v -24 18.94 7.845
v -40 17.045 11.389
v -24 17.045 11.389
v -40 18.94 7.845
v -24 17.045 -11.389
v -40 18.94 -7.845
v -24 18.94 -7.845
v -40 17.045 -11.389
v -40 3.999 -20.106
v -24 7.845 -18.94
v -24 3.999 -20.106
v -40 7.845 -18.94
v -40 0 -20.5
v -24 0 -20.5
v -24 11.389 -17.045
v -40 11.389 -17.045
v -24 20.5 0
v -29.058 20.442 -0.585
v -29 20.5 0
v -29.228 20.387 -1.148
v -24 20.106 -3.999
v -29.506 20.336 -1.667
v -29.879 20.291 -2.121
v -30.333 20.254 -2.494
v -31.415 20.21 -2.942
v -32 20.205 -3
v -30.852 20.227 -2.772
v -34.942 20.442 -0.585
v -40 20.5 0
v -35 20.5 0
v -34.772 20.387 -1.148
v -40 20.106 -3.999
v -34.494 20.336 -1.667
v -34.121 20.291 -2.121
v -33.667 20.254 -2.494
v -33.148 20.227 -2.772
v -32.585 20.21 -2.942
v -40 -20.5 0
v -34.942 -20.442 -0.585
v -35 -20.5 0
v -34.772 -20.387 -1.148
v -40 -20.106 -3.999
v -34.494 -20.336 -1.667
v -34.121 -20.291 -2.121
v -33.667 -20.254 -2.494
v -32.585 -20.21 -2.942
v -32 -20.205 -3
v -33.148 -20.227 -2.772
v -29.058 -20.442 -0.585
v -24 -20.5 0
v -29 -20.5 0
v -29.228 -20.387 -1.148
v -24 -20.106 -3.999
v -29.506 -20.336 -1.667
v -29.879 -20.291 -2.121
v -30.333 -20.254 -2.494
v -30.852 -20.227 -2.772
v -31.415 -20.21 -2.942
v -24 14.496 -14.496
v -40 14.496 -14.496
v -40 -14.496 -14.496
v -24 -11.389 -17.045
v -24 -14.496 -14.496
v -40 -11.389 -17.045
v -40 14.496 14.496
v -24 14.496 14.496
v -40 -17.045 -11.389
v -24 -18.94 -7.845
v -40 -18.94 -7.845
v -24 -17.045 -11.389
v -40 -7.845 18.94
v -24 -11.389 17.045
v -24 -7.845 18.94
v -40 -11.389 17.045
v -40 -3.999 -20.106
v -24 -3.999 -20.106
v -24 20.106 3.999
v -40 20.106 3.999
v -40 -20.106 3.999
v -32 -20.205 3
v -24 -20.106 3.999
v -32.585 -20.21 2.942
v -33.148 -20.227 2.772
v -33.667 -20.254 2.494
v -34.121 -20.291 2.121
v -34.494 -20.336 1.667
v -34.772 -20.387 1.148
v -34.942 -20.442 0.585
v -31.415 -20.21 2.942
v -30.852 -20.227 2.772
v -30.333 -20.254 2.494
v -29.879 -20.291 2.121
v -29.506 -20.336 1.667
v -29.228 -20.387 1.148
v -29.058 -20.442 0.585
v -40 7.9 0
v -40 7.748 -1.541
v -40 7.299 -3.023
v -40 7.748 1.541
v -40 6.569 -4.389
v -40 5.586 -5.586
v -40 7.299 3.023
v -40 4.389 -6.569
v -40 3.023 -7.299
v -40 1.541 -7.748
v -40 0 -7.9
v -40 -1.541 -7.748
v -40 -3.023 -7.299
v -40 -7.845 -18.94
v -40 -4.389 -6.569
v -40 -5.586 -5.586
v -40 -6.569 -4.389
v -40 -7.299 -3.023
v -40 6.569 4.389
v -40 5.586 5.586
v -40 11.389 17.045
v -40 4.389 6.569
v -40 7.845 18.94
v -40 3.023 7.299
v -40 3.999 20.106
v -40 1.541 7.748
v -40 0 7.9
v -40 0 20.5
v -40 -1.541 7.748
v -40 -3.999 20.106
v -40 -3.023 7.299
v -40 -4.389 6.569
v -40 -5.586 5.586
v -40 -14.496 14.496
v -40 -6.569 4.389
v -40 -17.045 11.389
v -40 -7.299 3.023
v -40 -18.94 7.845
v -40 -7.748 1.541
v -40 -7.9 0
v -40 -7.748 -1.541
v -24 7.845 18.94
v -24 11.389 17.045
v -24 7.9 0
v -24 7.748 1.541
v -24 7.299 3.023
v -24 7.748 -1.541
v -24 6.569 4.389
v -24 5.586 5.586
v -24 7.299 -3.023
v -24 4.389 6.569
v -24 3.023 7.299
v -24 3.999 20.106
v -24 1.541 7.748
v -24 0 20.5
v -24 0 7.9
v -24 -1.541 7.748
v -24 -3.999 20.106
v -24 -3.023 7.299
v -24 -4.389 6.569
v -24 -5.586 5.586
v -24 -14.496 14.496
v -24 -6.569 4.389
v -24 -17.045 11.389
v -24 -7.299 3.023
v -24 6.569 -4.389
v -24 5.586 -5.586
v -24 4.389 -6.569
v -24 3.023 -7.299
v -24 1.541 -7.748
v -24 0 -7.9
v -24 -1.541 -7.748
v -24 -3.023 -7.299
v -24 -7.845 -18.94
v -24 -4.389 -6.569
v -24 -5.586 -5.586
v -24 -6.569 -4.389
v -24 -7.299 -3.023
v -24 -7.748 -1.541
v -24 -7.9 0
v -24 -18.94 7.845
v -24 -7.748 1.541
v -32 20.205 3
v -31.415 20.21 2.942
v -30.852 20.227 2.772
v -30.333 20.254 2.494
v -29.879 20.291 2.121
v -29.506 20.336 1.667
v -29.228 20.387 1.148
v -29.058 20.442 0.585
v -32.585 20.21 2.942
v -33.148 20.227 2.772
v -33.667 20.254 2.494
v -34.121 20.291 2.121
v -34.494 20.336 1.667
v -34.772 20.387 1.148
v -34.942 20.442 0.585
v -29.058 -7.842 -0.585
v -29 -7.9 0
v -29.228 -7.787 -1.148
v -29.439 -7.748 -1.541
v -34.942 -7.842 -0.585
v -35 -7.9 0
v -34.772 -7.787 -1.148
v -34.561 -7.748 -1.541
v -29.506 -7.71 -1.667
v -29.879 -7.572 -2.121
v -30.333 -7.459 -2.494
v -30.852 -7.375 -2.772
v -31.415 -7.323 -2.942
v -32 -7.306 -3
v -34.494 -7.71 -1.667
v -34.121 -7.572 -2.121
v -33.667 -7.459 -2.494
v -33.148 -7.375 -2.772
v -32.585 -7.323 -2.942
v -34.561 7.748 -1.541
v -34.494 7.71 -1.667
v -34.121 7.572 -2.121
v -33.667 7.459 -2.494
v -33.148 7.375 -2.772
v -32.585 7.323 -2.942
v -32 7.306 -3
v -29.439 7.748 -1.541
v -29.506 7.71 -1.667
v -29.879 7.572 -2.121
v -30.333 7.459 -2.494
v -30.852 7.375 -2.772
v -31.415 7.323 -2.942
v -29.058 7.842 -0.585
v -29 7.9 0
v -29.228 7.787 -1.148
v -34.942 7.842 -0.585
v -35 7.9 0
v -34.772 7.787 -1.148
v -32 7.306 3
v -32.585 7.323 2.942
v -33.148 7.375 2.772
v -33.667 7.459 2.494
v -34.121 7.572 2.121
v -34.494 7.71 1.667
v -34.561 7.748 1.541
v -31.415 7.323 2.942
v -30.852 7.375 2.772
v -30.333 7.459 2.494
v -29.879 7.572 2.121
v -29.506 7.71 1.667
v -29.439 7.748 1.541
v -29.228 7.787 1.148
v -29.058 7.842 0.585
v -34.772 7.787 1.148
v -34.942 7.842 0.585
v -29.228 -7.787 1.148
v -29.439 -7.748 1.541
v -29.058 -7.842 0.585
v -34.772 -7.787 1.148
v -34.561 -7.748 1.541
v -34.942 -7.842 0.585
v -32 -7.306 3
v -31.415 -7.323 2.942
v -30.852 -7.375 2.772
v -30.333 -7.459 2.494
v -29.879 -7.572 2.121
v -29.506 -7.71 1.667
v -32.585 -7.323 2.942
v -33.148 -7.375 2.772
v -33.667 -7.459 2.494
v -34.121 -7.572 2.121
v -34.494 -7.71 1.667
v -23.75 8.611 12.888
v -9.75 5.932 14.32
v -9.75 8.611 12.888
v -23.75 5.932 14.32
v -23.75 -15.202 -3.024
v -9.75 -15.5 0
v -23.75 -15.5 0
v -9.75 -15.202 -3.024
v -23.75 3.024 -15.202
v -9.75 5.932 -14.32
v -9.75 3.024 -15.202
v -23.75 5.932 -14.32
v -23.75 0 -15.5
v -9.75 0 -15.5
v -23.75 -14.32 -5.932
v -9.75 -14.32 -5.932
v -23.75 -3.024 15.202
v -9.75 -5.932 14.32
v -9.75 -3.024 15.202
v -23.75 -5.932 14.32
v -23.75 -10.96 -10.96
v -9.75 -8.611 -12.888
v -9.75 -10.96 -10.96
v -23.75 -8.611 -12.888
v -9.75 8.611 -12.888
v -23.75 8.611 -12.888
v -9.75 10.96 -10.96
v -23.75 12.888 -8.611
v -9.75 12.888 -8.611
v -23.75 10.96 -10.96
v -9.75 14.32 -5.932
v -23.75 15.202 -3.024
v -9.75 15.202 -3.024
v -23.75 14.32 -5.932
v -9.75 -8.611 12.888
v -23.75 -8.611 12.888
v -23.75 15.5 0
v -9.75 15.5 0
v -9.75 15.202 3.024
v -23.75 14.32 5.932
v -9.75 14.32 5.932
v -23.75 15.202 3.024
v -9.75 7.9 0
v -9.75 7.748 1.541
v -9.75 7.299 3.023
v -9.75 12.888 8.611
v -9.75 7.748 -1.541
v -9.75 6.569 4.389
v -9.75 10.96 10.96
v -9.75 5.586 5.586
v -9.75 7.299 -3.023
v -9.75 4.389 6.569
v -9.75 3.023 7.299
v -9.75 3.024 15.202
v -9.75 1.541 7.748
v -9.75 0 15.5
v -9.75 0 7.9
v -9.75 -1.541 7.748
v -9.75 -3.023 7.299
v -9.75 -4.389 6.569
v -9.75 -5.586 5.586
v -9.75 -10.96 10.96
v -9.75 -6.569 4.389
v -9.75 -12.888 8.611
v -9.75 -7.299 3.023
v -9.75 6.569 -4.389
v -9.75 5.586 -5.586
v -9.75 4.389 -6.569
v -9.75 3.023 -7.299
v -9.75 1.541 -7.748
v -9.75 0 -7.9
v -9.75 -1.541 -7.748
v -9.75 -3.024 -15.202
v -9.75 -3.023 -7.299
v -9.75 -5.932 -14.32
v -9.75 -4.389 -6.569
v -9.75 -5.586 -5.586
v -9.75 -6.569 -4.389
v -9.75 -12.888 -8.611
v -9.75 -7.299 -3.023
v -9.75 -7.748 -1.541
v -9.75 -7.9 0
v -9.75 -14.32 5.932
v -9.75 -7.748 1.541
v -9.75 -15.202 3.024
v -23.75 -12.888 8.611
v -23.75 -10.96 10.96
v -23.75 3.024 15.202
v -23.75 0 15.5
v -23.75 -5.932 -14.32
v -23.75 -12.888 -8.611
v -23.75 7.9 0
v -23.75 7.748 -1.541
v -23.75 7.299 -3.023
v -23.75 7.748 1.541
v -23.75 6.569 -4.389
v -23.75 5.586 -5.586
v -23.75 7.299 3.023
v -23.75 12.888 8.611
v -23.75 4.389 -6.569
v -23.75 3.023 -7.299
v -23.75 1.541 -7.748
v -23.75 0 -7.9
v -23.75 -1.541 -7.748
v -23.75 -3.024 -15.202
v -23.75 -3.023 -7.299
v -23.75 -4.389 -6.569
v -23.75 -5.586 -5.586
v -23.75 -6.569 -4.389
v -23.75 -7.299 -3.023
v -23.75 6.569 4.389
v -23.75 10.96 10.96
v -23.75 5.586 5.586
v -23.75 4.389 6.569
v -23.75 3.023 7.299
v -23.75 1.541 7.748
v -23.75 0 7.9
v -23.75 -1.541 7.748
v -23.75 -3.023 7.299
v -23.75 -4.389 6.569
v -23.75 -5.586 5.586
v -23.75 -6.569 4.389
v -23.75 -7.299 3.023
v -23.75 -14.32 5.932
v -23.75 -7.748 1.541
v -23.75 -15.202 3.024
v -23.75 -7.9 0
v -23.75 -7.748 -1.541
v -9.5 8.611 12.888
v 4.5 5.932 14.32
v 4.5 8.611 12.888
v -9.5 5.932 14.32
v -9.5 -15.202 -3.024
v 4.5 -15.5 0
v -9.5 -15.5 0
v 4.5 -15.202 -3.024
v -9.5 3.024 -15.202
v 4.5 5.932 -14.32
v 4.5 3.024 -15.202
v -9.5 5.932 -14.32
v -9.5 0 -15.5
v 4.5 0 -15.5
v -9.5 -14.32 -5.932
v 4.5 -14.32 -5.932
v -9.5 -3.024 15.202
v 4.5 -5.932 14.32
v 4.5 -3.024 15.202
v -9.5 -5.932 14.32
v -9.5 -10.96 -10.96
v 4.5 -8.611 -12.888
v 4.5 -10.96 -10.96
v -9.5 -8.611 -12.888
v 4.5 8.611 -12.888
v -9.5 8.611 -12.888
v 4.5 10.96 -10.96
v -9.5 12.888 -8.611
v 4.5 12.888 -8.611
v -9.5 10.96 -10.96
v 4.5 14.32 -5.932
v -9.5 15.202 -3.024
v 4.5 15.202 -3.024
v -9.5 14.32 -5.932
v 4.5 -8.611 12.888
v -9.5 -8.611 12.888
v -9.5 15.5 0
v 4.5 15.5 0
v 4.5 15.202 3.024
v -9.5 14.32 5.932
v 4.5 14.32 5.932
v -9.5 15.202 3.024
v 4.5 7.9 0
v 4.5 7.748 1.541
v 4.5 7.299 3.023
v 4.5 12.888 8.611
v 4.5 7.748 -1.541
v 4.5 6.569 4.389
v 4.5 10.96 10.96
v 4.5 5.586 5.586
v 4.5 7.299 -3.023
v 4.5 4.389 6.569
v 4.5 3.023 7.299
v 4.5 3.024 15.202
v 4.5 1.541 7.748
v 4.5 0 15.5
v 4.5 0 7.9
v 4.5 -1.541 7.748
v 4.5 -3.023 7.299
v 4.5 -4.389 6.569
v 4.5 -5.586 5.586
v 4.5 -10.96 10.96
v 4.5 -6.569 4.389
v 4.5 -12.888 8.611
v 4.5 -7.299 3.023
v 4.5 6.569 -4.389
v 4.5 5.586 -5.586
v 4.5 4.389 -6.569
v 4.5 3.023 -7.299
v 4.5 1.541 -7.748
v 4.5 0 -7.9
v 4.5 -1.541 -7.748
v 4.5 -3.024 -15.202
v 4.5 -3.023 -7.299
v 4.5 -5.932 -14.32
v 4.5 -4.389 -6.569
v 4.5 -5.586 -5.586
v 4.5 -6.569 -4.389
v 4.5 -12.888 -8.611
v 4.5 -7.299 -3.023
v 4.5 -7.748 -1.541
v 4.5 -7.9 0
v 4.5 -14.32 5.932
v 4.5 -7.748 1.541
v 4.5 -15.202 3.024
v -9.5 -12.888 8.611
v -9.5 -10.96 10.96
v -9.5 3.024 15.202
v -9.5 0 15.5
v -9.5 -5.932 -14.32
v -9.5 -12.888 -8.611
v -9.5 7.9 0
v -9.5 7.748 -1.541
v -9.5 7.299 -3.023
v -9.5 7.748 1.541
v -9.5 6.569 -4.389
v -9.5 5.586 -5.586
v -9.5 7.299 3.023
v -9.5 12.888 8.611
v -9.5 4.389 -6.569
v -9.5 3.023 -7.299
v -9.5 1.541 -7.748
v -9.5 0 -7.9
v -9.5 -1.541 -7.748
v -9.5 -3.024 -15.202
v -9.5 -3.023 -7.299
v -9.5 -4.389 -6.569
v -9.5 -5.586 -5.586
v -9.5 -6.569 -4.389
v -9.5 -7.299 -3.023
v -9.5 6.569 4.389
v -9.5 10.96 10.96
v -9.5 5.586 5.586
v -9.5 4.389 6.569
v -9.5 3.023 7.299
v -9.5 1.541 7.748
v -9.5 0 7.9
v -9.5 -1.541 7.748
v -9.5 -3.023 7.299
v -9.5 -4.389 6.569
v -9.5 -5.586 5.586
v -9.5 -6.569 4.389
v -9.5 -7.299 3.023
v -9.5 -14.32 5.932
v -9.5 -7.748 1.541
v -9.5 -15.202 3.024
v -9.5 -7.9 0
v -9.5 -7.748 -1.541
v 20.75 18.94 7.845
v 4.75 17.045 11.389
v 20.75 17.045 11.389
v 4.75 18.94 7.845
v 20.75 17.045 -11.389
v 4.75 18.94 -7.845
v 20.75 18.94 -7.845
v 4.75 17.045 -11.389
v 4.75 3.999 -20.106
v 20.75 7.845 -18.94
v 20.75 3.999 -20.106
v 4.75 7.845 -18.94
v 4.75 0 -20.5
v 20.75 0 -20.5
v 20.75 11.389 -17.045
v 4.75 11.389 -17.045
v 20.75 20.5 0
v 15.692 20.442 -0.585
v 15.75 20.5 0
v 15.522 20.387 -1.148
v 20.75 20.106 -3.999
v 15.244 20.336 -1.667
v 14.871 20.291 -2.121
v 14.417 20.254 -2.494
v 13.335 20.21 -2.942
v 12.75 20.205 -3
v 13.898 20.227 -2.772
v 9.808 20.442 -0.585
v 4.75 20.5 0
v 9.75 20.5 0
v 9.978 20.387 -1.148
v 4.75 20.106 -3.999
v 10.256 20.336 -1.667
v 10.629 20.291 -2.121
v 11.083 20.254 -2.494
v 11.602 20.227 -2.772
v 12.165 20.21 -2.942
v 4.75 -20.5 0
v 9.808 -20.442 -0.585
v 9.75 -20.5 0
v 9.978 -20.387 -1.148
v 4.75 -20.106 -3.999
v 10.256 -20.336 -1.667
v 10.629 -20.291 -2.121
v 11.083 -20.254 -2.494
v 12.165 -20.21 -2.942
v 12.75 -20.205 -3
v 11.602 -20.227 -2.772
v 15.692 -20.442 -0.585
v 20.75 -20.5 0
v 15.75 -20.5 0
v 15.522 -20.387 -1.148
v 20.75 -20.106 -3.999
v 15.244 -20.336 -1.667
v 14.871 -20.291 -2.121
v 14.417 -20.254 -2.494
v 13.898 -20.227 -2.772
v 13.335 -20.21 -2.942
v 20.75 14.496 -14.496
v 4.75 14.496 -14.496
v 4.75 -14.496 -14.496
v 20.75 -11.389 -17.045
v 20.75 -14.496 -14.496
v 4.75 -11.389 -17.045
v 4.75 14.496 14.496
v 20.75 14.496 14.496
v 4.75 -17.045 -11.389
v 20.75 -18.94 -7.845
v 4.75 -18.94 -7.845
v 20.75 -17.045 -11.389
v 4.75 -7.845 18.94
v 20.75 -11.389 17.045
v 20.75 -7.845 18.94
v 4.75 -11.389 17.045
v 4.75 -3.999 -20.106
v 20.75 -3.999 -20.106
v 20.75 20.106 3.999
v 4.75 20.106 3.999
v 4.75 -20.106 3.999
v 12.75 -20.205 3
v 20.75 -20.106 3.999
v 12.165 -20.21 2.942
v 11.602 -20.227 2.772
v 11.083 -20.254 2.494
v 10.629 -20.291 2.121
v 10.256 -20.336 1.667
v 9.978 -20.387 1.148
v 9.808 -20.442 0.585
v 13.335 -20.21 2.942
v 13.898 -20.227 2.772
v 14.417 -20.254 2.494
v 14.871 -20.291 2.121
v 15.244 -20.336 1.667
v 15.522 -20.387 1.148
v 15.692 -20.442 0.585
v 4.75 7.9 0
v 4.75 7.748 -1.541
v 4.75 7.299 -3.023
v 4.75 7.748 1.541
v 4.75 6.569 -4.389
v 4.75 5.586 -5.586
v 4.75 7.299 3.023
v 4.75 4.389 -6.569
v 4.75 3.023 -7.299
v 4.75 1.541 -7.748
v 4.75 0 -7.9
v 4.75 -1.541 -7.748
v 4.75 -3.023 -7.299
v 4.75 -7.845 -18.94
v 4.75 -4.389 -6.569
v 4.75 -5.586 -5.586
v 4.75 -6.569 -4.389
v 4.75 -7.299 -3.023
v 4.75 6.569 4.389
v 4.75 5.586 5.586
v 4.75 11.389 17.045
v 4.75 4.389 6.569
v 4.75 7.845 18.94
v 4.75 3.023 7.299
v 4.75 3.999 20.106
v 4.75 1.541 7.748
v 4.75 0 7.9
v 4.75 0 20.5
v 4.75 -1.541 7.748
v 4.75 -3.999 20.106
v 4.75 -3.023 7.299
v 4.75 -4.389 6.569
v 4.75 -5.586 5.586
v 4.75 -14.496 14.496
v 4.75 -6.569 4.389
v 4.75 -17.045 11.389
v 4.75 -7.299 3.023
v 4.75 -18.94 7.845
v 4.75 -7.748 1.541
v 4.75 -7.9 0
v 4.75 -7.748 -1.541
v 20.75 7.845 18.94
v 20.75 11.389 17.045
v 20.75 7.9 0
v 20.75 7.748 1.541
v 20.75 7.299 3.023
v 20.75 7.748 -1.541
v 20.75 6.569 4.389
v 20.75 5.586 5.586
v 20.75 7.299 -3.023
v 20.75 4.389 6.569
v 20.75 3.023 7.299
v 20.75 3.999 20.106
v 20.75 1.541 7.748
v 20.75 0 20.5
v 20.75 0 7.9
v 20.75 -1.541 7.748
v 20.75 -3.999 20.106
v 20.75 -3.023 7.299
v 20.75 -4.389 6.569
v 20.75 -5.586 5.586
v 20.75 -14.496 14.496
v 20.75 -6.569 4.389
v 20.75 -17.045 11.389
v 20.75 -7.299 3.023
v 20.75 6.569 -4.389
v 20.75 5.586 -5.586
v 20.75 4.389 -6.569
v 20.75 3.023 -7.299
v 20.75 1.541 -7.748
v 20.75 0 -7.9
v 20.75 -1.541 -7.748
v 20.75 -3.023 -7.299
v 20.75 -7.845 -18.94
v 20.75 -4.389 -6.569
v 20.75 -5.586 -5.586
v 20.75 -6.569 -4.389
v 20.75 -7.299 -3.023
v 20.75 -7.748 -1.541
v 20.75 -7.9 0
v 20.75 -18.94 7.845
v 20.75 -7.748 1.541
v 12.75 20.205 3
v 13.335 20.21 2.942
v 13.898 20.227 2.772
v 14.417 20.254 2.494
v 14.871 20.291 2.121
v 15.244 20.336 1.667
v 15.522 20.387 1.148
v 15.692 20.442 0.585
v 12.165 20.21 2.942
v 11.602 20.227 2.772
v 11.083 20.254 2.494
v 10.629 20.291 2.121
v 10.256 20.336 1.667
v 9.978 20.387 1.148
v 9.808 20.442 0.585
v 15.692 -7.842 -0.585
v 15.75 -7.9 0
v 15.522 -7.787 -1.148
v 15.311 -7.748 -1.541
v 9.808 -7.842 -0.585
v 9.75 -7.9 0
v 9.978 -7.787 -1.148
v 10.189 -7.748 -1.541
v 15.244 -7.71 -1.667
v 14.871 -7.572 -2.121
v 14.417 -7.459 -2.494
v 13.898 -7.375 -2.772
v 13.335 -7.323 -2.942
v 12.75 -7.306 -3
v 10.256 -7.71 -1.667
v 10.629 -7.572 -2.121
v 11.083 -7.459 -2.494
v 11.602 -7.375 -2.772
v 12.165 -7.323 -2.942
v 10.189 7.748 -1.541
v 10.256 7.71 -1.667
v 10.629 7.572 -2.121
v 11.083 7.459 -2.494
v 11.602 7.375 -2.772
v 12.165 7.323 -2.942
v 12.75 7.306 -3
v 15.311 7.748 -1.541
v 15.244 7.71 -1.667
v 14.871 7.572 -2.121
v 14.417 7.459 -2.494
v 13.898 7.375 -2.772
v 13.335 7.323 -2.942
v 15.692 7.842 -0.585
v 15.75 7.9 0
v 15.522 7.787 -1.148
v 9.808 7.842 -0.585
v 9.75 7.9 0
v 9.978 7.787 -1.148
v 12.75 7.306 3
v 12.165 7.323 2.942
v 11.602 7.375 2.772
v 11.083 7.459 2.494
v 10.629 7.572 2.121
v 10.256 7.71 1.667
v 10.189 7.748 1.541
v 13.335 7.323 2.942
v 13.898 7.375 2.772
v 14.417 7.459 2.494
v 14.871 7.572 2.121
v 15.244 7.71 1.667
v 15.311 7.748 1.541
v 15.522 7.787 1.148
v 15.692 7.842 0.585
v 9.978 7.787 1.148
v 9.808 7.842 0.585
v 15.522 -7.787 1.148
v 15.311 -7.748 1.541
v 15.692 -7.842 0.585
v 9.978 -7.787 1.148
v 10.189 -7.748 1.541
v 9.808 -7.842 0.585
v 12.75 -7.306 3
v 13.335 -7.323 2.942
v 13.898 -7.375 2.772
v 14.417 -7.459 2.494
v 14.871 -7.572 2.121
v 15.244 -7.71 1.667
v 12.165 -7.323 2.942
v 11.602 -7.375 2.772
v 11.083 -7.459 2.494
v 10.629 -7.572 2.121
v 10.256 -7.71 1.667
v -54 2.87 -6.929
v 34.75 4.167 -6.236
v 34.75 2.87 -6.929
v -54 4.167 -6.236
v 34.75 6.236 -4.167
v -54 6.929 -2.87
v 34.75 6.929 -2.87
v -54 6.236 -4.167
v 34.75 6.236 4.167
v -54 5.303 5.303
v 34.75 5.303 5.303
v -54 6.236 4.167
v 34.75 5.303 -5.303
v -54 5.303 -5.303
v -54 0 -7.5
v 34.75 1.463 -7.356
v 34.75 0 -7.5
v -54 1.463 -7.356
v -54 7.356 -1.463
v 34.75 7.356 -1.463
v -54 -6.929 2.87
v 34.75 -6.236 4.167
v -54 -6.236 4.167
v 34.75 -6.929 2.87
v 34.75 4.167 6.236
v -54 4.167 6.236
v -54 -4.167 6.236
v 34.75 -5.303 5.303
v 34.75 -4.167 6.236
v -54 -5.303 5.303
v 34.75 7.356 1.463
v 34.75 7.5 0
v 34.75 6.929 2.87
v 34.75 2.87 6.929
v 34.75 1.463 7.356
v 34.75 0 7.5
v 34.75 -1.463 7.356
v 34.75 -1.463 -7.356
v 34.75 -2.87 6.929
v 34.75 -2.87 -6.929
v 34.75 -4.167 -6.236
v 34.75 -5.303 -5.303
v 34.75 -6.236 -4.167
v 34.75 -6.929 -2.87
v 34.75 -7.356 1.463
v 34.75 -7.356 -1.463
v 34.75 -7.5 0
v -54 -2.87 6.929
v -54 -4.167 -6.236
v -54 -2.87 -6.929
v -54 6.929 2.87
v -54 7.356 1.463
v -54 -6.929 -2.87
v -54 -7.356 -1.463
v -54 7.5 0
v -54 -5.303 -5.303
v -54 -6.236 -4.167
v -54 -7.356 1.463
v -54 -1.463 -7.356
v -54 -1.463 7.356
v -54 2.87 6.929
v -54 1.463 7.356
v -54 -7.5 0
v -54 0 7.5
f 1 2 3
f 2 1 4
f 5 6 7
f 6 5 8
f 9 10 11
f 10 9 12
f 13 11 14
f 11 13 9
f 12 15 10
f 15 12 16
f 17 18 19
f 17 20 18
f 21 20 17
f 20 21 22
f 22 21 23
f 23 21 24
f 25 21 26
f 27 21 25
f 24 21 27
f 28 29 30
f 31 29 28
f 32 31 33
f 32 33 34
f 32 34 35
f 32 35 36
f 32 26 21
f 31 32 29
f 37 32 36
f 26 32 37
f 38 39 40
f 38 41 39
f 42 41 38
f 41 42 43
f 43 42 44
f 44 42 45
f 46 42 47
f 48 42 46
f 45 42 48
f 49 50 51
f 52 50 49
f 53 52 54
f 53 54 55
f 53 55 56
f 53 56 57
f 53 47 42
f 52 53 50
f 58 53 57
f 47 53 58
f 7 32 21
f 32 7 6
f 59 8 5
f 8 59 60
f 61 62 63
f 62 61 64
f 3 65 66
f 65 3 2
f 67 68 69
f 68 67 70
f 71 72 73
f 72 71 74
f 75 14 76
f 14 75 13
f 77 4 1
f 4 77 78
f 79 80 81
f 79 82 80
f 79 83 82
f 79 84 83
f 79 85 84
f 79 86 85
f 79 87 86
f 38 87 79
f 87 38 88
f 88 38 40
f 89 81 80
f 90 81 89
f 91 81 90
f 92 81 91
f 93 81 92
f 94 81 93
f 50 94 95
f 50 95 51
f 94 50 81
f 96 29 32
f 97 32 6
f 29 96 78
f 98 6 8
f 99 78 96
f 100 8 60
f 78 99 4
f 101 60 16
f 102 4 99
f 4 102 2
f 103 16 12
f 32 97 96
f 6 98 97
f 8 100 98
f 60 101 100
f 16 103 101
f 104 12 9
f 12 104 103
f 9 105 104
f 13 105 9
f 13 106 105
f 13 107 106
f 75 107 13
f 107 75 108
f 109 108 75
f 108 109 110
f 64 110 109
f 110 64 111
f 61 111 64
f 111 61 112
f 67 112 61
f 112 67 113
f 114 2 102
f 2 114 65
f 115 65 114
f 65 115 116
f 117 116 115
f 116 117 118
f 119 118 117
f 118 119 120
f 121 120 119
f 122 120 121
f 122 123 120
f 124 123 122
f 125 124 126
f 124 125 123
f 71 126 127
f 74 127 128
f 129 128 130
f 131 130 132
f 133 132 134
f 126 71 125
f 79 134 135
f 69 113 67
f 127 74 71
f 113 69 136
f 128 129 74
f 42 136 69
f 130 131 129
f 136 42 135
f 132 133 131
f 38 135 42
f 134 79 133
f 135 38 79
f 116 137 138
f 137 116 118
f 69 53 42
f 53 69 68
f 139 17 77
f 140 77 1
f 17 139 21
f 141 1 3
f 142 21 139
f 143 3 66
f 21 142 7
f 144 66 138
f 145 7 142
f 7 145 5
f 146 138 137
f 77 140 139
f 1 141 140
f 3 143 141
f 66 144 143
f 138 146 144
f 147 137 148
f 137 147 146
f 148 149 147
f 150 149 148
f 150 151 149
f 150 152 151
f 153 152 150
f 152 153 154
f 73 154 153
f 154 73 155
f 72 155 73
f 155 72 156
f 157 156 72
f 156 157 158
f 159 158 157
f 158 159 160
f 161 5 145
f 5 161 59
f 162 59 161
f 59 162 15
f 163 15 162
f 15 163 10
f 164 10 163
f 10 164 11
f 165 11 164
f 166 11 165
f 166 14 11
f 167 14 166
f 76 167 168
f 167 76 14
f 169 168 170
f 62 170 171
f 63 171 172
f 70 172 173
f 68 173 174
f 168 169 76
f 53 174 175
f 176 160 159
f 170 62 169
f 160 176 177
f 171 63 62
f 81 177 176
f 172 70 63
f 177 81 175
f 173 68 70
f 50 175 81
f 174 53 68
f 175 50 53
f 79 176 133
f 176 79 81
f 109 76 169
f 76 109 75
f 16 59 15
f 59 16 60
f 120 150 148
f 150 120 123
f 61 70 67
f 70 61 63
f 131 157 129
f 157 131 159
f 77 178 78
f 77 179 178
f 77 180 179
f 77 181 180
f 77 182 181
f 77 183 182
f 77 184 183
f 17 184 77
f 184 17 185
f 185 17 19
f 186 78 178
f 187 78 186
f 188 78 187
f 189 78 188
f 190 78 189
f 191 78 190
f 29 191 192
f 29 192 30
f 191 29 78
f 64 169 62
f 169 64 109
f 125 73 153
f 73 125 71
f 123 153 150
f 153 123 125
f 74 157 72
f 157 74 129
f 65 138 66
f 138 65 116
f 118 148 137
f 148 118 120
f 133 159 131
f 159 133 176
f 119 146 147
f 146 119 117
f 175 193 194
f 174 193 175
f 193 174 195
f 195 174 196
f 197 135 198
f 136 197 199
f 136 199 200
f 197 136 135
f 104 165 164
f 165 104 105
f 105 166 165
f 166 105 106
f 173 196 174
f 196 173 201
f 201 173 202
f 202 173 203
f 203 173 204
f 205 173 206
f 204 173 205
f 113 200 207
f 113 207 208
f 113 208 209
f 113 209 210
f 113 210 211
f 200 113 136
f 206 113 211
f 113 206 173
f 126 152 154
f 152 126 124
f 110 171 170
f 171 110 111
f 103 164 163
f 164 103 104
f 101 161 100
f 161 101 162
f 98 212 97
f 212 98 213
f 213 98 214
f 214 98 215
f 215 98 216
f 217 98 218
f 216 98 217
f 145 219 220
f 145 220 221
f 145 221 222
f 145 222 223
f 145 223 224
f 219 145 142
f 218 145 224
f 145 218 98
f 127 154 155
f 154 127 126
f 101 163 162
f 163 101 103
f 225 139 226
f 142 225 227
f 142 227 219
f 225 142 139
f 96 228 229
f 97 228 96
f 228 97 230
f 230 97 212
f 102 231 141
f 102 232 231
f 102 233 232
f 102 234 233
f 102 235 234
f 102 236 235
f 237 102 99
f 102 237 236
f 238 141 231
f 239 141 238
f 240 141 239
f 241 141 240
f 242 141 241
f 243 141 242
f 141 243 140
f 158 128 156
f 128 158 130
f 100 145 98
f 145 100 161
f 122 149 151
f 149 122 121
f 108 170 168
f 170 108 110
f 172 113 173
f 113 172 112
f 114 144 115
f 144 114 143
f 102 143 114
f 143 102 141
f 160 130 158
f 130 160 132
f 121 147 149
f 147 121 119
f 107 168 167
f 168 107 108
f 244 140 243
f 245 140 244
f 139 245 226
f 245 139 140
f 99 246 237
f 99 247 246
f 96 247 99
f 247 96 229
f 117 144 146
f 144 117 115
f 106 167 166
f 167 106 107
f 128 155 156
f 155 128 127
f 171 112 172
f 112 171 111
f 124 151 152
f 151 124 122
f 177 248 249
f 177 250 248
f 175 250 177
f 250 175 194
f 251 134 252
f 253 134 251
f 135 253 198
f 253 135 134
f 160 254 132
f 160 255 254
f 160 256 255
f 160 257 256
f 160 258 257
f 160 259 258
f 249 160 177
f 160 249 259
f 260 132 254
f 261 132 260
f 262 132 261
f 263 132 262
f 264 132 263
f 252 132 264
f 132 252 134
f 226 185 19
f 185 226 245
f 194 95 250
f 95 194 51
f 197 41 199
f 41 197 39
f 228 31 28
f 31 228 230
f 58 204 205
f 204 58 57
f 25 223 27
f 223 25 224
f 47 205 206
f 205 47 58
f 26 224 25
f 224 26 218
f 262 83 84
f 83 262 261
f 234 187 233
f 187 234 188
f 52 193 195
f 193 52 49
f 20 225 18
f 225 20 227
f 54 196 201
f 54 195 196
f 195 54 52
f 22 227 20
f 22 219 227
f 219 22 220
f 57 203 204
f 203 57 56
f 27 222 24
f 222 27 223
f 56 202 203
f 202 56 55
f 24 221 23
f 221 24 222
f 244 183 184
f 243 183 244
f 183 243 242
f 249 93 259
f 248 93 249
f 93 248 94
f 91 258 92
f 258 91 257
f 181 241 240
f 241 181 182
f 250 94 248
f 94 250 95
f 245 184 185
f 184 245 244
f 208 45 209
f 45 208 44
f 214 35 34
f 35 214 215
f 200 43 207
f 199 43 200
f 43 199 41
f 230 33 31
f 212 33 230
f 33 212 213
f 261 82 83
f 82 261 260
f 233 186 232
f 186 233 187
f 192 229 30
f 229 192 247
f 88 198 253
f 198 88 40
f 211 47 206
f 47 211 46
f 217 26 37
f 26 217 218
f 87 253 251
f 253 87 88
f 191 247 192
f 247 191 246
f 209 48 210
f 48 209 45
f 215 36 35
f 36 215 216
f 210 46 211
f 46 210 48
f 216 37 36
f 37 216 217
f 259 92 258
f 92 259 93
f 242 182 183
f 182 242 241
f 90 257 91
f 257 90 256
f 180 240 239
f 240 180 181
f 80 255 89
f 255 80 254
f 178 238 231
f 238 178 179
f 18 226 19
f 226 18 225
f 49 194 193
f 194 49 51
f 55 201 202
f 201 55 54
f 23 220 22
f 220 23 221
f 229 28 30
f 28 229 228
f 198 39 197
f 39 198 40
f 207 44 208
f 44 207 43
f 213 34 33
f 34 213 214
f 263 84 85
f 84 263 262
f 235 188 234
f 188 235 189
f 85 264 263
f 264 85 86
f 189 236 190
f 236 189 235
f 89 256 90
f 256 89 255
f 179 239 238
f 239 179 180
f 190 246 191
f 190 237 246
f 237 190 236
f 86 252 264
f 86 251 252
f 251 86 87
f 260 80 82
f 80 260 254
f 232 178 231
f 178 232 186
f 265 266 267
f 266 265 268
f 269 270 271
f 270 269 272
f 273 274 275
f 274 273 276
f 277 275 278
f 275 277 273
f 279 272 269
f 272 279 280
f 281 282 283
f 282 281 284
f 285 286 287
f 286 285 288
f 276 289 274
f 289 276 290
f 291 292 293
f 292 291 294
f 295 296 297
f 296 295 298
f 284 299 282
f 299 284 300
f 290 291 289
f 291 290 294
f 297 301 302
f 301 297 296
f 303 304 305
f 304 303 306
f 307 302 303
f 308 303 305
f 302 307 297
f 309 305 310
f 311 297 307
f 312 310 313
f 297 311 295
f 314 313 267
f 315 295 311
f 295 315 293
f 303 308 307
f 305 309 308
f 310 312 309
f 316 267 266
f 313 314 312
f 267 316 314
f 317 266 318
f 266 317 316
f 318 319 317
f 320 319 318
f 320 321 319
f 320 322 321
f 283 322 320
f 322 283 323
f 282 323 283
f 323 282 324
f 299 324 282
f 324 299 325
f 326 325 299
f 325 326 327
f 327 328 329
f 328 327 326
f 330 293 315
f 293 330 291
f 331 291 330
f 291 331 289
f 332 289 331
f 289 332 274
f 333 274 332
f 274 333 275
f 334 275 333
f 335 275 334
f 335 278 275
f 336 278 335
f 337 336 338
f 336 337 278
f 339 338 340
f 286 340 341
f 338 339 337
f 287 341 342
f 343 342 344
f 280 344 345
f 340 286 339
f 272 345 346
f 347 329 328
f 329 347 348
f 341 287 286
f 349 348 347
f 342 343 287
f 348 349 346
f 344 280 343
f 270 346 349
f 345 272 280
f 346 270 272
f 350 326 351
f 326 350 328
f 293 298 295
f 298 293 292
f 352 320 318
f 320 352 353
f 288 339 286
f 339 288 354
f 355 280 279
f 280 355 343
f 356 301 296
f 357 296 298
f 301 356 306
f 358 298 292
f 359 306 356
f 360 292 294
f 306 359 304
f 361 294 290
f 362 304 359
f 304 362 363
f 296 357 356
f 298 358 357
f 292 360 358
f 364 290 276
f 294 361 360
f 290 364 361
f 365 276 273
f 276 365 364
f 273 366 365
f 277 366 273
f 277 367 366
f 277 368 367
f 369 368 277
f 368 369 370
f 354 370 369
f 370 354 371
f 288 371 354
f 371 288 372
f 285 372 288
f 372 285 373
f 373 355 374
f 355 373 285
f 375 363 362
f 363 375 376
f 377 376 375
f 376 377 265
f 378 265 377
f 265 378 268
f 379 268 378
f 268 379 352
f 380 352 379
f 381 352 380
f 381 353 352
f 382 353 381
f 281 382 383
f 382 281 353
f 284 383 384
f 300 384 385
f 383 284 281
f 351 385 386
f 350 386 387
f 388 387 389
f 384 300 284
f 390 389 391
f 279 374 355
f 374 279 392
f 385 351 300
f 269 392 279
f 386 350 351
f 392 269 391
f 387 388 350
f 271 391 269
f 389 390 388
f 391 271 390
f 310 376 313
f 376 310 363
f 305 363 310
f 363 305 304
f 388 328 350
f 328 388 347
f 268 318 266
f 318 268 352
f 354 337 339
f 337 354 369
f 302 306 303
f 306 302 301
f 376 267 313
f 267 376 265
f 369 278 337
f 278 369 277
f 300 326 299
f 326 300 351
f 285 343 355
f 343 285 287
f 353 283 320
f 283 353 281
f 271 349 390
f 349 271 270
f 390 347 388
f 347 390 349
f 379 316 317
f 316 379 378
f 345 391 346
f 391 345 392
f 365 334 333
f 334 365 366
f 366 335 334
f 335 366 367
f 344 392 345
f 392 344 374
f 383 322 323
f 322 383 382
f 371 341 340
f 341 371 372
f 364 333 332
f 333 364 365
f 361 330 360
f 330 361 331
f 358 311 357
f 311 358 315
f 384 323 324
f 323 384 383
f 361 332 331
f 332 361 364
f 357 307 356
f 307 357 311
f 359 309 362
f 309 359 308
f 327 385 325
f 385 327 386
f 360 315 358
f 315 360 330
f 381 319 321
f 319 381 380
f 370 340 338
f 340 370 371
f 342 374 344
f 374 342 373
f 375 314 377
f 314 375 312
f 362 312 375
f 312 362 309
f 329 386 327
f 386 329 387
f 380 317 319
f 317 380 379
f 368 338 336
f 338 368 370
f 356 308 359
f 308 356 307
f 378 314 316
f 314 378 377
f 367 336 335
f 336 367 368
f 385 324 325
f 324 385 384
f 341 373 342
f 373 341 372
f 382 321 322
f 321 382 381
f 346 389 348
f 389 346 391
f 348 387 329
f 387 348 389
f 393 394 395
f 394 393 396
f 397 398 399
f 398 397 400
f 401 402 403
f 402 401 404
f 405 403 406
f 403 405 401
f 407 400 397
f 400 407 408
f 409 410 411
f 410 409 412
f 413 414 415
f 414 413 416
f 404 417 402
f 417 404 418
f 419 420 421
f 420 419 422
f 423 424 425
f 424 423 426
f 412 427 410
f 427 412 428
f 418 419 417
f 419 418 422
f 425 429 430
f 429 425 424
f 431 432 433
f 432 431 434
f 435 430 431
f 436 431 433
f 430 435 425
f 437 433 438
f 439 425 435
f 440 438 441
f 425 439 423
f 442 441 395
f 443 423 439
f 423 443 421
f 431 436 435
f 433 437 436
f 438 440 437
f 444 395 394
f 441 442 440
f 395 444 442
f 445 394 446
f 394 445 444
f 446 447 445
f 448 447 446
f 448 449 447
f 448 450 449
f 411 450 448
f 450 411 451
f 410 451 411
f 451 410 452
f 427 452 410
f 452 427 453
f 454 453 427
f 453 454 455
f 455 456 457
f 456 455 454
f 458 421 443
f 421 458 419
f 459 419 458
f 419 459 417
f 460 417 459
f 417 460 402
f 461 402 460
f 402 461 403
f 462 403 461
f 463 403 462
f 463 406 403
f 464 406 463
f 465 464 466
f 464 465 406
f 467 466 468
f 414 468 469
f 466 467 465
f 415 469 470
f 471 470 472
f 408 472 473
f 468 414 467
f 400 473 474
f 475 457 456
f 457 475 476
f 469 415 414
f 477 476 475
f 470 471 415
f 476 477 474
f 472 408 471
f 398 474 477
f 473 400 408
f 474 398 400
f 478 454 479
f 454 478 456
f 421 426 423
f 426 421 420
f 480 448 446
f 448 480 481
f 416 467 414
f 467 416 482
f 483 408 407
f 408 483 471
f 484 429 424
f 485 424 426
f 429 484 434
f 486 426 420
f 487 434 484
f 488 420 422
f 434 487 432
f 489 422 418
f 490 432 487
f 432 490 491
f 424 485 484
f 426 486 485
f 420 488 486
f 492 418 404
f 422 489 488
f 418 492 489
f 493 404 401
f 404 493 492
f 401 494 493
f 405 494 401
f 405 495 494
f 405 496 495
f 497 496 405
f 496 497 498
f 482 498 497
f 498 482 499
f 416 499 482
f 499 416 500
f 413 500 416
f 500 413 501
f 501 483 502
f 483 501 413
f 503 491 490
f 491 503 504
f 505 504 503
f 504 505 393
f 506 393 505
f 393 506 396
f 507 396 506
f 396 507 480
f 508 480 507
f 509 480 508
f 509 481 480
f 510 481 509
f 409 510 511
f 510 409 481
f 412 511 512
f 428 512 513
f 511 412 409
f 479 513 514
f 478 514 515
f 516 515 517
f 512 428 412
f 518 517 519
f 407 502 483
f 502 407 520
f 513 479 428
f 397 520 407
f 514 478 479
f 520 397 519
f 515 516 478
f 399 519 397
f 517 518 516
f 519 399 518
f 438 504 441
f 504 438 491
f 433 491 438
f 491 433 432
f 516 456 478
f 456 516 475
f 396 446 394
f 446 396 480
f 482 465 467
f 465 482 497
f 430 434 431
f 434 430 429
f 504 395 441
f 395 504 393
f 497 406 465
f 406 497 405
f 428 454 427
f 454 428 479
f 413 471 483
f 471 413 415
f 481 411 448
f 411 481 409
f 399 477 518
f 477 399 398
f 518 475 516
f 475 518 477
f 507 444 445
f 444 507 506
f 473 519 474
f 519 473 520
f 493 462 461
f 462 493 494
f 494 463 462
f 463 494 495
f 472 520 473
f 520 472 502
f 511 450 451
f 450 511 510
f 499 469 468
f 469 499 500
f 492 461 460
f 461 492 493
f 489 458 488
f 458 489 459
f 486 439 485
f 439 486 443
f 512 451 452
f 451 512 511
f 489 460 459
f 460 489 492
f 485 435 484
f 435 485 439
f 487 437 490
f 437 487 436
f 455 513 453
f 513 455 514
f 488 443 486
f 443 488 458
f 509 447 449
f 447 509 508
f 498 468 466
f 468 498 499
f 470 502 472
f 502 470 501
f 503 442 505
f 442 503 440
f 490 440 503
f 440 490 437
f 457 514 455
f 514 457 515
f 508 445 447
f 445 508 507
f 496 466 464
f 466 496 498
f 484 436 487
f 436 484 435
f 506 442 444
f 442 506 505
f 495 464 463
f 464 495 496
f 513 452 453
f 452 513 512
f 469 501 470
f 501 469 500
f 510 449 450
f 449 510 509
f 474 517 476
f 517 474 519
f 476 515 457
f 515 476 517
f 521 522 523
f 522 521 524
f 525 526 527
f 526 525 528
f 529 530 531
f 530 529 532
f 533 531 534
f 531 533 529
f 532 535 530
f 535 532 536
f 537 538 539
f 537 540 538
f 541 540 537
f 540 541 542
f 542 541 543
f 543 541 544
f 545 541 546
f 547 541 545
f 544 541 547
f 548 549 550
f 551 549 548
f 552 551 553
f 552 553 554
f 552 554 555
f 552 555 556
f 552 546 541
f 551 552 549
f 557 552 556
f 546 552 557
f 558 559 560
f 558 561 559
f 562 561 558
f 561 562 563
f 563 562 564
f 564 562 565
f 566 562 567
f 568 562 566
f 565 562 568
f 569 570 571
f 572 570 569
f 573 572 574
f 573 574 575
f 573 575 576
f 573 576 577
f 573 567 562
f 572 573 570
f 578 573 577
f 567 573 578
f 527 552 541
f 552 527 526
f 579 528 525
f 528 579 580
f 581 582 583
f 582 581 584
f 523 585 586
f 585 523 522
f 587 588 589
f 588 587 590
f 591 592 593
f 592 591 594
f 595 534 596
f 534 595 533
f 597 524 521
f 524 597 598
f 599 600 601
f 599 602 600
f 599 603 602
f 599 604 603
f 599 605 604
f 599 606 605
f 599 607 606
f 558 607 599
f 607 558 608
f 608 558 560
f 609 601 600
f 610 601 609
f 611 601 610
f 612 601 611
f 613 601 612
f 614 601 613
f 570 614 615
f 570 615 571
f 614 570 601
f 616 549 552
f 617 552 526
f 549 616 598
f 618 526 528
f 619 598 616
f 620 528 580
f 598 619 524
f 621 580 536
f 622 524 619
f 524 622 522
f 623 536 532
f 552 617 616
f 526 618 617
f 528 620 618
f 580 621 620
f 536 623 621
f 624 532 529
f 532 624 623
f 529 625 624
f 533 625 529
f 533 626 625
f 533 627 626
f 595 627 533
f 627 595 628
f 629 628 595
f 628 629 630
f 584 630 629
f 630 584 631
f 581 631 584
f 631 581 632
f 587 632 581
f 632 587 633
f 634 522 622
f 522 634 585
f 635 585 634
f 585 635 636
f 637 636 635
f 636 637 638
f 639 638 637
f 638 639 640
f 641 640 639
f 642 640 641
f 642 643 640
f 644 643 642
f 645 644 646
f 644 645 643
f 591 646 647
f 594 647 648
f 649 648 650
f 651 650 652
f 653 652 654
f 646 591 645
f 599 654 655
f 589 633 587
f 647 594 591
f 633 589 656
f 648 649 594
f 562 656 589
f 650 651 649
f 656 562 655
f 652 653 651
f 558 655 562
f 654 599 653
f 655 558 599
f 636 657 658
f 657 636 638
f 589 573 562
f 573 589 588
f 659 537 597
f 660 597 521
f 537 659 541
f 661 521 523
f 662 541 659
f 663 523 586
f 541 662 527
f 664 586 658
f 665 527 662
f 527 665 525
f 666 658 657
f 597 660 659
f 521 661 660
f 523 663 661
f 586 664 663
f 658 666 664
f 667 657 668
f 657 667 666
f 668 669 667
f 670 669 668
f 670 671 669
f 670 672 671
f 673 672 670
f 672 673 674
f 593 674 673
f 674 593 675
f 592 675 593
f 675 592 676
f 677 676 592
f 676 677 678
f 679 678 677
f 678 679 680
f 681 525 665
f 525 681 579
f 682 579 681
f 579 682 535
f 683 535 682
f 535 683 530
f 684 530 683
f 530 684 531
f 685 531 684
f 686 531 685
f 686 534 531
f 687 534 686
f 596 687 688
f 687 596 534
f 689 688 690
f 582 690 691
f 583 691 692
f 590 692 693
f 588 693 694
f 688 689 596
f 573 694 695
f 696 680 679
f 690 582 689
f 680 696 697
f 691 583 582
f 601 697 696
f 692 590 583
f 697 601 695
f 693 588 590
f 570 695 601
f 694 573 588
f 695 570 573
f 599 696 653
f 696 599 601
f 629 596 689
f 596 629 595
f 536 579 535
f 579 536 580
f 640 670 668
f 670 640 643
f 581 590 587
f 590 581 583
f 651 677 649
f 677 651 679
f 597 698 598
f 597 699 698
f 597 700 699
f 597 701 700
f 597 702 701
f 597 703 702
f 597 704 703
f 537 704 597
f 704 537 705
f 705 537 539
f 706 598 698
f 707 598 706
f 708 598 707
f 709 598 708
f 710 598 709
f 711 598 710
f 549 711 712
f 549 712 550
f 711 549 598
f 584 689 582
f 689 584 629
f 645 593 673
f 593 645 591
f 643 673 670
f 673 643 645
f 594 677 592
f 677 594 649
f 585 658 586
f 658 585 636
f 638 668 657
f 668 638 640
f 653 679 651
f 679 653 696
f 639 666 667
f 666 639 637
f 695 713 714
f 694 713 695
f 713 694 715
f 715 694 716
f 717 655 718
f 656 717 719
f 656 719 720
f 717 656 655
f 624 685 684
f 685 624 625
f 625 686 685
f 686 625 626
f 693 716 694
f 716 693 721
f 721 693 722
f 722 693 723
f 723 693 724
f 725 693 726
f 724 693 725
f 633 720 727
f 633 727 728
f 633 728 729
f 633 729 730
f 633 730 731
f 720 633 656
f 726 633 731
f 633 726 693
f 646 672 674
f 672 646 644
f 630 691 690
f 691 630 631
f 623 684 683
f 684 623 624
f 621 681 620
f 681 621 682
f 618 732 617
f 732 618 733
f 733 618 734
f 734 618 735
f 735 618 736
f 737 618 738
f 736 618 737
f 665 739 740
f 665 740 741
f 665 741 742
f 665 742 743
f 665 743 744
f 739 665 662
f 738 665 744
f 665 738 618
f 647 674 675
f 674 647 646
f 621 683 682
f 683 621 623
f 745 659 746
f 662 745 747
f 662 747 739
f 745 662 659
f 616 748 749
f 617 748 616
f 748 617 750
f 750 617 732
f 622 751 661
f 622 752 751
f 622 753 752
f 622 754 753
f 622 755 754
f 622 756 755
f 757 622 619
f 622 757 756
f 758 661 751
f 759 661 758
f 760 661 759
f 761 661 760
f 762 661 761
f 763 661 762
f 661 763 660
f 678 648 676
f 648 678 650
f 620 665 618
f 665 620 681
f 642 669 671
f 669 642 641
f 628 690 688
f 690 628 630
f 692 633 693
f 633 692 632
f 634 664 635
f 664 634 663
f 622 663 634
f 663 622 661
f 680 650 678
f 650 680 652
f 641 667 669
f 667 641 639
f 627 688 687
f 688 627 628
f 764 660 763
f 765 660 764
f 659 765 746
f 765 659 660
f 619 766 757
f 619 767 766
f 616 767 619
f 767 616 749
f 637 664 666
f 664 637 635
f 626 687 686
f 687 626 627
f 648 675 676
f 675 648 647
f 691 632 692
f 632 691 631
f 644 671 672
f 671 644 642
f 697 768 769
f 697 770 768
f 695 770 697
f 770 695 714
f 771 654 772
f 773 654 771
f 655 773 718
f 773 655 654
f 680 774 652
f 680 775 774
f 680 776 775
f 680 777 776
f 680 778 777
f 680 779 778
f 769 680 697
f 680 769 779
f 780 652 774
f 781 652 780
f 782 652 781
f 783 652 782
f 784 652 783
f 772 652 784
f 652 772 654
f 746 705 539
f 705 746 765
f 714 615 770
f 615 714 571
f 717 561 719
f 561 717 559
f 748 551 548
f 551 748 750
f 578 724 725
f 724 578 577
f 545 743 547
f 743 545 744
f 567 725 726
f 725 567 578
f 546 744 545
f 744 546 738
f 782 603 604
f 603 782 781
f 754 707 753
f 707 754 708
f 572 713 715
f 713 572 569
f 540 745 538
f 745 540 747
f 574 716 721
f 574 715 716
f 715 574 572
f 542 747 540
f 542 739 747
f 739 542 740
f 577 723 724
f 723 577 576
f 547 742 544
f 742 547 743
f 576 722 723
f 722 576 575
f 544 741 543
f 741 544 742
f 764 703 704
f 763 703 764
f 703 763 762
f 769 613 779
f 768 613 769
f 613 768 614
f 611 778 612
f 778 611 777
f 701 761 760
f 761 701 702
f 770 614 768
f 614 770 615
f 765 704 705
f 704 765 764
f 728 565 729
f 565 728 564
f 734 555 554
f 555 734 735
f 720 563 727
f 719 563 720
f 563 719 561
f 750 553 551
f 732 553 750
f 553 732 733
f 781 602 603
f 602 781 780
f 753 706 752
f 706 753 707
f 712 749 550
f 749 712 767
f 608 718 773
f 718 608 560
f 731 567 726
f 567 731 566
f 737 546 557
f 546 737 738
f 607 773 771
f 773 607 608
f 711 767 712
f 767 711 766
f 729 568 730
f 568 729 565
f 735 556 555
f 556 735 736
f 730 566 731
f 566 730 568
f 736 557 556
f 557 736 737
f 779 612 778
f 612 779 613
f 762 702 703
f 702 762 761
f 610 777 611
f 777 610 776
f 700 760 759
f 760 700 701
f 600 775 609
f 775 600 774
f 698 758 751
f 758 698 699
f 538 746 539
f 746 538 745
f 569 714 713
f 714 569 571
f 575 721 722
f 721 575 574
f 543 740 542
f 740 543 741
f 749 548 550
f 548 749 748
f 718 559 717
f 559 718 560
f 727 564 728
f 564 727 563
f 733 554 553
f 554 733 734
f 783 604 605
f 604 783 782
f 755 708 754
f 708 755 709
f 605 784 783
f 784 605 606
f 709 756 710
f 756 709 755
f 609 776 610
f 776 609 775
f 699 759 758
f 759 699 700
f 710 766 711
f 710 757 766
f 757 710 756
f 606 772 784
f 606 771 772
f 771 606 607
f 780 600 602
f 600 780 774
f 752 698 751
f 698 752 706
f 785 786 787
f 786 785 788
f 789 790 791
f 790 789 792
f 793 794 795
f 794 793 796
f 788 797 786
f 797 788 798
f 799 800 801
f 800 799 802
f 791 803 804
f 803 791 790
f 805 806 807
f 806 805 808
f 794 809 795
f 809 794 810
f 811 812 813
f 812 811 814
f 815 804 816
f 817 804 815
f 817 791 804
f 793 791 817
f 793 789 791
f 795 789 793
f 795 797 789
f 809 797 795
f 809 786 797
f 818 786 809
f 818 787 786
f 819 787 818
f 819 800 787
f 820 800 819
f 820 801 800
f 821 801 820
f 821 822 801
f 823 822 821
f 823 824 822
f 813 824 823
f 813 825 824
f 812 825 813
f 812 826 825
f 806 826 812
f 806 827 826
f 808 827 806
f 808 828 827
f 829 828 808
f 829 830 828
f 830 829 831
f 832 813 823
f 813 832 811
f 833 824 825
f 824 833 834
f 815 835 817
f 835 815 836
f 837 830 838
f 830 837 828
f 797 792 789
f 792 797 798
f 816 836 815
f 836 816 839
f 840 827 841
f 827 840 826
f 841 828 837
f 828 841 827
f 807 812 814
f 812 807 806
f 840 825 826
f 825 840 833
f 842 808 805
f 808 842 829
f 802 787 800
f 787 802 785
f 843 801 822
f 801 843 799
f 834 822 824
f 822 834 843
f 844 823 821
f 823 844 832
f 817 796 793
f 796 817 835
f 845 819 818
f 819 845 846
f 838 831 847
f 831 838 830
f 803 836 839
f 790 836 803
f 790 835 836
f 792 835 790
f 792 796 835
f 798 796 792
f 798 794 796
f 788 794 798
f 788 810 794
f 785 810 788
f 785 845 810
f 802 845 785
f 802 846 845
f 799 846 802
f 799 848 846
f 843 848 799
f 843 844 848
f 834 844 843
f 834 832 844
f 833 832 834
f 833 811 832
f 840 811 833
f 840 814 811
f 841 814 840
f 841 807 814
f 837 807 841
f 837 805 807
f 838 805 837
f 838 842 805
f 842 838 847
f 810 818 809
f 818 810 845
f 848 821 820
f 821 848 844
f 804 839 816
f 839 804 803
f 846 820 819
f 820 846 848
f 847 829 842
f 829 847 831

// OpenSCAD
$fn = 32;

// ------------------------------------------------------------------------
// Shaft with rings and collars: d15 shaft, 4 rings
// Every part is its own module, assembly() places them once.
// ------------------------------------------------------------------------

// --- part 1 ---
module shaft() {
  translate([0, 0, -44.375]) cylinder(h = 88.75, d = 15);
}

// --- part 2 ---
module collar_a() {
  difference() {
    cylinder(h = 16, d = 41);
    translate([0, 0, -1]) cylinder(h = 18, d = 15.8);
    translate([0, 0, 8]) rotate([90, 0, 0]) cylinder(h = 43, d = 6, center = true);
  }
}

// --- part 3 ---
module spacer_a() {
  difference() {
      translate([0, 0, 0]) cylinder(h = 14, d = 31);
      translate([0, 0, -1]) cylinder(h = 16, d = 15.8);
    }
}

// --- part 4 ---
module spacer_b() {
  difference() {
      translate([0, 0, 0]) cylinder(h = 14, d = 31);
      translate([0, 0, -1]) cylinder(h = 16, d = 15.8);
    }
}

// --- part 5 ---
module collar_b() {
  difference() {
    cylinder(h = 16, d = 41);
    translate([0, 0, -1]) cylinder(h = 18, d = 15.8);
    translate([0, 0, 8]) rotate([90, 0, 0]) cylinder(h = 43, d = 6, center = true);
  }
}

// --- assembly ---
module assembly() {
  translate([-9.625, 0, 0]) rotate([0, 90, 0]) shaft();
  translate([-40, 0, 0]) rotate([0, 90, 0]) collar_a();
  translate([-23.75, 0, 0]) rotate([0, 90, 0]) spacer_a();
  translate([-9.5, 0, 0]) rotate([0, 90, 0]) spacer_b();
  translate([4.75, 0, 0]) rotate([0, 90, 0]) collar_b();
}

assembly();
